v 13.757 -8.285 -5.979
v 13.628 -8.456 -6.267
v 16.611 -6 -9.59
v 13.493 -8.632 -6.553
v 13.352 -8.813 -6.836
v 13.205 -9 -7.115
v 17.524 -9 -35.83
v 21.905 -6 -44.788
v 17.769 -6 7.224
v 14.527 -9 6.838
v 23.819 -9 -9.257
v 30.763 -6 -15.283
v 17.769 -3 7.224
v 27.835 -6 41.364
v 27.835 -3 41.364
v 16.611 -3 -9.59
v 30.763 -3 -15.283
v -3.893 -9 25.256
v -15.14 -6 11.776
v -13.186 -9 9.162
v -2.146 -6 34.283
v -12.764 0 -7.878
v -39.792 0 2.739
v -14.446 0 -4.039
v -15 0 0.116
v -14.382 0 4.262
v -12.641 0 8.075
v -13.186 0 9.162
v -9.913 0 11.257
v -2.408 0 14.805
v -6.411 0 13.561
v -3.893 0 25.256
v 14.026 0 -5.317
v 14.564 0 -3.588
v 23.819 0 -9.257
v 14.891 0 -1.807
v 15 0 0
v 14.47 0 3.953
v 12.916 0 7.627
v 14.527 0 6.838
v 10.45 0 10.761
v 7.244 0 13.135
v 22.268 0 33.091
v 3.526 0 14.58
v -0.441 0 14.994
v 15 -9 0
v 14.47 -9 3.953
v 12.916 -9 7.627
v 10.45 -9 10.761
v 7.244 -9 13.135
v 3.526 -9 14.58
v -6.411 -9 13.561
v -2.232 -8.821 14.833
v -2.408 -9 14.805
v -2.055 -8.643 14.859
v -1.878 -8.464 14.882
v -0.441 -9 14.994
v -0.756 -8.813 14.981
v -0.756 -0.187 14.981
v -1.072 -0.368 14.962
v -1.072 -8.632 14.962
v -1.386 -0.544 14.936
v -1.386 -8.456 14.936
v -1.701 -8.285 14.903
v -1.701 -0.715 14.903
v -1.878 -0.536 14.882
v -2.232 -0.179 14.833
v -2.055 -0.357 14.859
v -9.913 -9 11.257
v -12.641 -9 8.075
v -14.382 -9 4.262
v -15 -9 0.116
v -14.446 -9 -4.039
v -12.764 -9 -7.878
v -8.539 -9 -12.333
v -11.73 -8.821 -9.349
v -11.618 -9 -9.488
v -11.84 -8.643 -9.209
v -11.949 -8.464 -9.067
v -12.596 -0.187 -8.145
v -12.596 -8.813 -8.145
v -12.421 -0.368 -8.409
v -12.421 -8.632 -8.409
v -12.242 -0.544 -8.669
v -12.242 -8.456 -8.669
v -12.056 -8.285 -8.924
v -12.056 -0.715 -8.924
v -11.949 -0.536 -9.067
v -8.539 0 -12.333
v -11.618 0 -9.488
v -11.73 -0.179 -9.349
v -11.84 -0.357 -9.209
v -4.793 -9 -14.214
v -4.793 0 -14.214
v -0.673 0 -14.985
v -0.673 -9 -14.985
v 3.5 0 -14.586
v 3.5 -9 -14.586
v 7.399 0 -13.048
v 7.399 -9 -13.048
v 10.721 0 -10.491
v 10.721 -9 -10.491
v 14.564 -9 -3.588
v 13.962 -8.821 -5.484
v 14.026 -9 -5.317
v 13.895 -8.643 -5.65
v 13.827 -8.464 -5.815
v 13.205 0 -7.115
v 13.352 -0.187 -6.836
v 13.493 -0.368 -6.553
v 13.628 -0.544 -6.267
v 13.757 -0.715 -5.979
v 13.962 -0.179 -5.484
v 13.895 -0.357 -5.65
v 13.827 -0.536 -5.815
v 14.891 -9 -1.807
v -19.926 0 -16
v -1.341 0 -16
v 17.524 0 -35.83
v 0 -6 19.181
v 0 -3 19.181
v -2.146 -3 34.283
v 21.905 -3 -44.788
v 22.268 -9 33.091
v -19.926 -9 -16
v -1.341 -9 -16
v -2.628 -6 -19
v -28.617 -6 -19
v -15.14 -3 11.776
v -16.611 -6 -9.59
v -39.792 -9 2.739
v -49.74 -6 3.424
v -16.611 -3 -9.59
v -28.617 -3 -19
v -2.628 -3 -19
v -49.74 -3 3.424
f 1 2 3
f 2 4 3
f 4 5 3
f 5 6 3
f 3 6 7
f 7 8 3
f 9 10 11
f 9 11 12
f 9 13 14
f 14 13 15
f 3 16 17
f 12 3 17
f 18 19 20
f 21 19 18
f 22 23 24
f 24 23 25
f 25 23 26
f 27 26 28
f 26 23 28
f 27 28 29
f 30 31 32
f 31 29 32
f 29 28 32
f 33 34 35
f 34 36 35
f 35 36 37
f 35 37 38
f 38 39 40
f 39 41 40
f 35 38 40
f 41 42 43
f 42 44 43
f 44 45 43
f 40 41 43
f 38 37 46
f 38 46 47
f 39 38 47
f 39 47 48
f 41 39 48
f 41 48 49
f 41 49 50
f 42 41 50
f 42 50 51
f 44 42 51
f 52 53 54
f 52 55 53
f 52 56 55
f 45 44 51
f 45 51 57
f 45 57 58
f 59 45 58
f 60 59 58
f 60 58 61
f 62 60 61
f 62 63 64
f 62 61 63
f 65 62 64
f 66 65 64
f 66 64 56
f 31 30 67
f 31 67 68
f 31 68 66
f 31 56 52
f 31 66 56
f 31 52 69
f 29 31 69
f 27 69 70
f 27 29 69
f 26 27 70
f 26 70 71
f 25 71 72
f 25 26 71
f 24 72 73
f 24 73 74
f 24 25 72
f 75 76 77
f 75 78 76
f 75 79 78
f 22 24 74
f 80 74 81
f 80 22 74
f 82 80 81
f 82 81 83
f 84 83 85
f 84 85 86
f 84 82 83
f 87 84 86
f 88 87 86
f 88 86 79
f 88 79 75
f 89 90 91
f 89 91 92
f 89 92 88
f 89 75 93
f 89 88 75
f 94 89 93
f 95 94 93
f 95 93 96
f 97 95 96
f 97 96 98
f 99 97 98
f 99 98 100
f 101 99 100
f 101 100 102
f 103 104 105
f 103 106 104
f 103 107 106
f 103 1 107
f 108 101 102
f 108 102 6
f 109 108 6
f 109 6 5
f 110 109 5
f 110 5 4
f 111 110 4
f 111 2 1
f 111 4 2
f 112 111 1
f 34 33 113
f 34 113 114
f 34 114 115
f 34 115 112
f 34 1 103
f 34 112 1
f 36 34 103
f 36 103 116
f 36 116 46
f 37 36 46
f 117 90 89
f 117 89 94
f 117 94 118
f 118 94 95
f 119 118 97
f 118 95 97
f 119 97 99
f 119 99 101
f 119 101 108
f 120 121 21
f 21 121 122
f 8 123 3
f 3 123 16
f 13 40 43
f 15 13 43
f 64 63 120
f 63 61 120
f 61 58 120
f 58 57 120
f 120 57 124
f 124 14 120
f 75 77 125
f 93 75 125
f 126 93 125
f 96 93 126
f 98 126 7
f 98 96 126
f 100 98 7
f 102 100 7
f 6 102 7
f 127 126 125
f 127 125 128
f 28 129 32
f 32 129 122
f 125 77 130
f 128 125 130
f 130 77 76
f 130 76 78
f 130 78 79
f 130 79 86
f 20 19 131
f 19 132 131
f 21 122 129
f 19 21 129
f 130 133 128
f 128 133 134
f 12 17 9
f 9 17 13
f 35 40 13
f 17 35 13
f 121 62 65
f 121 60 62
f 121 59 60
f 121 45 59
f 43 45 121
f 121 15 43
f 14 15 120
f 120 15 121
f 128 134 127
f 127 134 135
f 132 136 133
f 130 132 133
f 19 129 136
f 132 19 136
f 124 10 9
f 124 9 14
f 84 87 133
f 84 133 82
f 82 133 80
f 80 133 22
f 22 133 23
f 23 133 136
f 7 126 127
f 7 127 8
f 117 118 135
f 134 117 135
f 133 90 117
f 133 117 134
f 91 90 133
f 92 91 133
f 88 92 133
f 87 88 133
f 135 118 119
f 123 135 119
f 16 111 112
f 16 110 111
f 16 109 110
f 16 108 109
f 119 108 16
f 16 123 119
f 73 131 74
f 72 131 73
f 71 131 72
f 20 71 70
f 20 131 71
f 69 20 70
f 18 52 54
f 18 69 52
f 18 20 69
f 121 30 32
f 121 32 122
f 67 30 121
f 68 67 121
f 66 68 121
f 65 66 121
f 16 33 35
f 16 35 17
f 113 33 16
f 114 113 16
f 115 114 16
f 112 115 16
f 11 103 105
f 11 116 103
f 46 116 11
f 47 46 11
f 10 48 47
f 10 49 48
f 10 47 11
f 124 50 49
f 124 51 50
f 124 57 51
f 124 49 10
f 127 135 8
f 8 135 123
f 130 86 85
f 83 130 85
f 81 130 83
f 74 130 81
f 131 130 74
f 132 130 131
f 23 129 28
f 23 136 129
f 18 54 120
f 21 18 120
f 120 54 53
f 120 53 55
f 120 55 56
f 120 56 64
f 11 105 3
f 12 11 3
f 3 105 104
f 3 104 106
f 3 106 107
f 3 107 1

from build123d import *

# Parameters (mm, degrees)
F0_R          = 15
F1_DEPTH      = 9
F2_DEPTH      = 9
F3_T4_DEPTH   = 41.4194656766
F3_T9_DEPTH   = 51.0233182668
F3_T14_DEPTH  = 51.0233182668
F3_T19_DEPTH  = 30.6843352159
F3_T24_DEPTH  = 41.4194656766
F3_T29_DEPTH  = 51.0233182668
F3_T34_DEPTH  = 51.0233182668
F3_T39_DEPTH  = 30.6843352159
F3_T44_DEPTH  = 41.4194656766
F3_T49_DEPTH  = 51.0233182668
F3_T54_DEPTH  = 51.0233182668
F3_T59_DEPTH  = 30.6843352159
F3_T64_DEPTH  = 51.0233182668
F3_T69_DEPTH  = 41.4194656766
F3_T74_DEPTH  = 51.0233182668
F3_T79_DEPTH  = 51.0233182668
F3_T84_DEPTH  = 41.4194656766
F3_T89_DEPTH  = 30.6843352159
F3_T94_DEPTH  = 51.0233182668
F3_T99_DEPTH  = 51.0233182668
F3_T104_DEPTH = 41.4194656766
F3_T109_DEPTH = 51.0233182668
F3_T114_DEPTH = 30.6843352159
F3_T119_DEPTH = 30.6843352159
F3_T125_DEPTH = 51.0233182668
F3_T129_DEPTH = 41.4194656766
F3_T136_DEPTH = 51.0233182668
F3_T140_DEPTH = 30.6843352159
F3_T147_DEPTH = 41.4194656766
F3_T151_DEPTH = 51.0233182668
F3_T158_DEPTH = 51.0233182668
F3_T162_DEPTH = 30.6843352159
F3_T169_DEPTH = 41.4194656766
F3_T173_DEPTH = 51.0233182668
F3_T180_DEPTH = 51.0233182668
F3_T184_DEPTH = 30.6843352159
F3_T191_DEPTH = 41.4194656766
F3_T195_DEPTH = 51.0233182668
F3_T202_DEPTH = 51.0233182668
F3_T206_DEPTH = 30.6843352159
F3_T213_DEPTH = 41.4194656766
F3_T217_DEPTH = 51.0233182668
F3_T224_DEPTH = 51.0233182668
F3_T228_DEPTH = 30.6843352159
F3_T235_DEPTH = 51.0233182668
F3_T239_DEPTH = 41.4194656766
F3_T246_DEPTH = 51.0233182668
F3_T250_DEPTH = 30.6843352159


# Not quite as in the source:
# - a fillet or chamfer that OpenCascade refuses, or shapes differently, is made with other operations: its cross-section is extruded or revolved along the edge and cut away or added


with BuildPart() as f1:
    # F0 (on Front) → F1 (new body)
    with BuildSketch(Plane.XZ):
        with BuildLine():
            ThreePointArc((-16.6111198958, -9.5904345434), (-19.1355906319, 1.3171598584), (-15.1404052923, 11.7759868593))
            Line((-15.1404052923, 11.7759868593), (-49.7397878859, 3.4237381657))
            Line((-49.7397878859, 3.4237381657), (-16.6111198958, -9.5904345434))
        make_face()
        with BuildLine():
            ThreePointArc((0, 19.1808690868), (10.7084892142, 15.9133276745), (17.7685064209, 7.2239821771))
            Line((17.7685064209, 7.2239821771), (27.8349381703, 41.3640508052))
            Line((27.8349381703, 41.3640508052), (0, 19.1808690868))
        make_face()
        with BuildLine():
            Line((21.9048497156, -44.7877889709), (16.6111198958, -9.5904345434))
            ThreePointArc((16.6111198958, -9.5904345434), (8.4271014177, -17.2304875329), (-2.6281011286, -18.9999690364))
            Line((-2.6281011286, -18.9999690364), (21.9048497156, -44.7877889709))
        make_face()
        with BuildLine():
            ThreePointArc((16.6111198958, -9.5904345434), (18.5272968216, -4.9643742213), (19.1808690868, 0))
            ThreePointArc((19.1808690868, 0), (18.8244672495, 3.6803765702), (17.7685064209, 7.2239821771))
            ThreePointArc((17.7685064209, 7.2239821771), (10.7084892142, 15.9133276745), (0, 19.1808690868))
            ThreePointArc((0, 19.1808690868), (-8.4271014177, 17.2304875329), (-15.1404052923, 11.7759868593))
            ThreePointArc((-15.1404052923, 11.7759868593), (-19.1355906319, 1.3171598584), (-16.6111198958, -9.5904345434))
            ThreePointArc((-16.6111198958, -9.5904345434), (-10.7084892142, -15.9133276745), (-2.6281011286, -18.9999690364))
            ThreePointArc((-2.6281011286, -18.9999690364), (8.4271014177, -17.2304875329), (16.6111198958, -9.5904345434))
        make_face()
        Circle(F0_R, mode=Mode.SUBTRACT)
    extrude(amount=F1_DEPTH)

    # F0 (on Front) → F2 (join)
    with BuildSketch(Plane.XZ):
        with BuildLine():
            ThreePointArc((16.6111198958, -9.5904345434), (18.5272968216, -4.9643742213), (19.1808690868, 0))
            ThreePointArc((19.1808690868, 0), (18.8244672495, 3.6803765702), (17.7685064209, 7.2239821771))
            ThreePointArc((17.7685064209, 7.2239821771), (10.7084892142, 15.9133276745), (0, 19.1808690868))
            ThreePointArc((0, 19.1808690868), (-8.4271014177, 17.2304875329), (-15.1404052923, 11.7759868593))
            ThreePointArc((-15.1404052923, 11.7759868593), (-19.1355906319, 1.3171598584), (-16.6111198958, -9.5904345434))
            ThreePointArc((-16.6111198958, -9.5904345434), (-10.7084892142, -15.9133276745), (-2.6281011286, -18.9999690364))
            ThreePointArc((-2.6281011286, -18.9999690364), (8.4271014177, -17.2304875329), (16.6111198958, -9.5904345434))
        make_face()
        Circle(F0_R, mode=Mode.SUBTRACT)
        with BuildLine():
            ThreePointArc((17.7685064209, 7.2239821771), (18.8244672495, 3.6803765702), (19.1808690868, 0))
            ThreePointArc((19.1808690868, 0), (18.5272968216, -4.9643742213), (16.6111198958, -9.5904345434))
            Line((16.6111198958, -9.5904345434), (30.7631902953, -15.2834705217))
            Line((30.7631902953, -15.2834705217), (17.7685064209, 7.2239821771))
        make_face()
        with BuildLine():
            ThreePointArc((0, 19.1808690868), (10.7084892142, 15.9133276745), (17.7685064209, 7.2239821771))
            Line((17.7685064209, 7.2239821771), (27.8349381703, 41.3640508052))
            Line((27.8349381703, 41.3640508052), (0, 19.1808690868))
        make_face()
        with BuildLine():
            Line((21.9048497156, -44.7877889709), (16.6111198958, -9.5904345434))
            ThreePointArc((16.6111198958, -9.5904345434), (8.4271014177, -17.2304875329), (-2.6281011286, -18.9999690364))
            Line((-2.6281011286, -18.9999690364), (21.9048497156, -44.7877889709))
        make_face()
        with BuildLine():
            ThreePointArc((-15.1404052923, 11.7759868593), (-8.4271014177, 17.2304875329), (0, 19.1808690868))
            Line((0, 19.1808690868), (-2.1457214179, 34.2834395581))
            Line((-2.1457214179, 34.2834395581), (-15.1404052923, 11.7759868593))
        make_face()
        with BuildLine():
            Line((-28.6174688775, -18.9999690364), (-2.6281011286, -18.9999690364))
            ThreePointArc((-2.6281011286, -18.9999690364), (-10.7084892142, -15.9133276745), (-16.6111198958, -9.5904345434))
            Line((-16.6111198958, -9.5904345434), (-28.6174688775, -18.9999690364))
        make_face()
        with BuildLine():
            ThreePointArc((-16.6111198958, -9.5904345434), (-19.1355906319, 1.3171598584), (-15.1404052923, 11.7759868593))
            Line((-15.1404052923, 11.7759868593), (-49.7397878859, 3.4237381657))
            Line((-49.7397878859, 3.4237381657), (-16.6111198958, -9.5904345434))
        make_face()
    extrude(amount=F2_DEPTH)

    # F3: chamfer of 3 on 24 edges, made by hand


with BuildPart() as f3_tool2:
    # F3_s3 → F3_t4 (new body)
    with BuildSketch(Plane(origin=(18.1662589207, 0, 31.4648834341), x_dir=(0, 1, 0), z_dir=(-0.5, 0, -0.8660254038))):
        Polygon((-6, -18.9999690364), (-9, -15.9999690364), (-9, -18.9999690364), align=None)
    extrude(amount=F3_T4_DEPTH)

    split(bisect_by=Plane(origin=(-3.5198762352, 0, 14.5811683787), x_dir=(0, 1, 0), z_dir=(-0.2346584157, 0, 0.9720778919)), keep=Keep.TOP)


with BuildPart() as f1_1:
    add(f1.part)

    # F3_t1: cut F3_tool2
    add(f3_tool2.part, mode=Mode.SUBTRACT)


with BuildPart() as f3_tool7:
    # F3_s8 → F3_t9 (new body)
    with BuildSketch(Plane(origin=(-4.1209005243, 0, -0.9947803527), x_dir=(0, 1, 0), z_dir=(-0.9720778919, 0, -0.2346584157))):
        Polygon((-6, -15), (-9, -12), (-9, -15), align=None)
    extrude(amount=F3_T9_DEPTH)

    split(bisect_by=Plane(origin=(-16.4544558566, 0, 9.4999845182), x_dir=(0, 1, 0), z_dir=(-0.8660254038, 0, 0.5)), keep=Keep.TOP)


with BuildPart() as f1_2:
    add(f1_1.part)

    # F3_t6: cut F3_tool7
    add(f3_tool7.part, mode=Mode.SUBTRACT)


with BuildPart() as f3_tool12:
    # F3_s13 → F3_t14 (new body)
    with BuildSketch(Plane(origin=(-51.4360857888, 0, 20.2060072), x_dir=(0, 1, 0), z_dir=(0.930757815, 0, -0.3656362809))):
        Polygon((-6, -15), (-9, -12), (-9, -15), align=None)
    extrude(amount=F3_T14_DEPTH)

    split(bisect_by=Plane(origin=(-1.6642890677, 0, 2.1235944635), x_dir=(0, 1, 0), z_dir=(-0.6168472612, 0, 0.7870828777)), keep=Keep.TOP)


with BuildPart() as f1_3:
    add(f1_2.part)

    # F3_t11: cut F3_tool12
    add(f3_tool12.part, mode=Mode.SUBTRACT)


with BuildPart() as f3_tool17:
    # F3_s18 → F3_t19 (new body)
    with BuildSketch(Plane(origin=(-8.8744478881, 0, -6.9550221835), x_dir=(0, 1, 0), z_dir=(-0.7870828777, 0, -0.6168472612))):
        Polygon((-9, 0.3019430054), (-6, -2.6980569946), (-9, -2.6980569946), align=None)
    extrude(amount=F3_T19_DEPTH)

    split(bisect_by=Plane(origin=(-5.4845442131, 0, -13.9613672244), x_dir=(0, 1, 0), z_dir=(-0.3656362809, 0, -0.930757815)), keep=Keep.TOP)


with BuildPart() as f1_4:
    add(f1_3.part)

    # F3_t16: cut F3_tool17
    add(f3_tool17.part, mode=Mode.SUBTRACT)


with BuildPart() as f3_tool22:
    # F3_s23 → F3_t24 (new body)
    with BuildSketch(Plane.YZ.offset(-36.3325178414)):
        Polygon((-9, -15.9999690364), (-6, -18.9999690364), (-9, -18.9999690364), align=None)
    extrude(amount=F3_T24_DEPTH)

    split(bisect_by=Plane(origin=(-10.8677241153, 0, -10.3388864272), x_dir=(0, 1, 0), z_dir=(-0.724514941, 0, -0.6892590951)), keep=Keep.TOP)


with BuildPart() as f1_5:
    add(f1_4.part)

    # F3_t21: cut F3_tool22
    add(f3_tool22.part, mode=Mode.SUBTRACT)


with BuildPart() as f3_tool27:
    # F3_s28 → F3_t29 (new body)
    with BuildSketch(Plane(origin=(2.9219553188, 0, -3.0714143641), x_dir=(0, 1, 0), z_dir=(0.6892590951, 0, -0.724514941))):
        Polygon((-9, -12), (-6, -15), (-9, -15), align=None)
    extrude(amount=F3_T29_DEPTH)

    split(bisect_by=Plane.XY.offset(-18.9999690364), keep=Keep.BOTTOM)


with BuildPart() as f1_6:
    add(f1_5.part)

    # F3_t26: cut F3_tool27
    add(f3_tool27.part, mode=Mode.SUBTRACT)


with BuildPart() as f3_tool32:
    # F3_s33 → F3_t34 (new body)
    with BuildSketch(Plane(origin=(8.2191273501, 0, -54.6479605643), x_dir=(0, 1, 0), z_dir=(-0.1487285997, 0, 0.988878053))):
        Polygon((-9, -12), (-6, -15), (-9, -15), align=None)
    extrude(amount=F3_T34_DEPTH)

    split(bisect_by=Plane(origin=(-1.0069422189, 0, -2.5031138436), x_dir=(0, 1, 0), z_dir=(-0.3732101364, 0, -0.9277468373)), keep=Keep.TOP)


with BuildPart() as f1_7:
    add(f1_6.part)

    # F3_t31: cut F3_tool32
    add(f3_tool32.part, mode=Mode.SUBTRACT)


with BuildPart() as f3_tool37:
    # F3_s38 → F3_t39 (new body)
    with BuildSketch(Plane(origin=(10.4604498388, 0, -4.207986224), x_dir=(0, 1, 0), z_dir=(0.9277468373, 0, -0.3732101364))):
        Polygon((-9, 0.3019430054), (-6, -2.6980569946), (-9, -2.6980569946), align=None)
    extrude(amount=F3_T39_DEPTH)

    split(bisect_by=Plane(origin=(14.8331707944, 0, 2.2309289955), x_dir=(0, 1, 0), z_dir=(0.988878053, 0, 0.1487285997)), keep=Keep.TOP)


with BuildPart() as f1_8:
    add(f1_7.part)

    # F3_t36: cut F3_tool37
    add(f3_tool37.part, mode=Mode.SUBTRACT)


with BuildPart() as f3_tool42:
    # F3_s43 → F3_t44 (new body)
    with BuildSketch(Plane(origin=(18.1662589207, 0, -31.4648834341), x_dir=(0, 1, 0), z_dir=(-0.5, 0, 0.8660254038))):
        Polygon((-9, -15.9999690364), (-6, -18.9999690364), (-9, -18.9999690364), align=None)
    extrude(amount=F3_T44_DEPTH)

    split(bisect_by=Plane(origin=(14.3876003504, 0, -4.2422819515), x_dir=(0, 1, 0), z_dir=(0.9591733567, 0, -0.2828187968)), keep=Keep.TOP)


with BuildPart() as f1_9:
    add(f1_8.part)

    # F3_t41: cut F3_tool42
    add(f3_tool42.part, mode=Mode.SUBTRACT)


with BuildPart() as f3_tool47:
    # F3_s48 → F3_t49 (new body)
    with BuildSketch(Plane(origin=(1.1989452055, 0, 4.0661947169), x_dir=(0, 1, 0), z_dir=(0.2828187968, 0, 0.9591733567))):
        Polygon((-9, -12), (-6, -15), (-9, -15), align=None)
    extrude(amount=F3_T49_DEPTH)

    split(bisect_by=Plane(origin=(16.4544558566, 0, 9.4999845182), x_dir=(0, 1, 0), z_dir=(0.8660254038, 0, 0.5)), keep=Keep.TOP)


with BuildPart() as f1_10:
    add(f1_9.part)

    # F3_t46: cut F3_tool47
    add(f3_tool47.part, mode=Mode.SUBTRACT)


with BuildPart() as f3_tool52:
    # F3_s53 → F3_t54 (new body)
    with BuildSketch(Plane(origin=(43.2169584386, 0, 34.4419533643), x_dir=(0, 1, 0), z_dir=(-0.7820292153, 0, -0.6232417721))):
        Polygon((-9, -12), (-6, -15), (-9, -15), align=None)
    extrude(amount=F3_T54_DEPTH)

    split(bisect_by=Plane(origin=(2.6712312866, 0, 0.3795193801), x_dir=(0, 1, 0), z_dir=(0.9900573976, 0, 0.1406639596)), keep=Keep.TOP)


with BuildPart() as f1_11:
    add(f1_10.part)

    # F3_t51: cut F3_tool52
    add(f3_tool52.part, mode=Mode.SUBTRACT)


with BuildPart() as f3_tool57:
    # F3_s58 → F3_t59 (new body)
    with BuildSketch(Plane(origin=(-1.5860019507, 0, 11.1630084074), x_dir=(0, 1, 0), z_dir=(-0.1406639596, 0, 0.9900573976))):
        Polygon((-9, 0.3019430054), (-6, -2.6980569946), (-9, -2.6980569946), align=None)
    extrude(amount=F3_T59_DEPTH)

    split(bisect_by=Plane(origin=(-9.3486265813, 0, 11.7304382289), x_dir=(0, 1, 0), z_dir=(-0.6232417721, 0, 0.7820292153)), keep=Keep.TOP)


with BuildPart() as f1_12:
    add(f1_11.part)

    # F3_t56: cut F3_tool57
    add(f3_tool57.part, mode=Mode.SUBTRACT)


with BuildPart() as f3_tool62:
    # F3_s63 → F3_t64 (new body)
    with BuildSketch(Plane(origin=(1.1989452055, 0, 4.0661947169), x_dir=(0, 1, 0), z_dir=(0.2828187968, 0, 0.9591733567))):
        Polygon((0, -12), (-3, -15), (0, -15), align=None)
    extrude(amount=F3_T64_DEPTH)

    split(bisect_by=Plane(origin=(16.4544558566, 0, 9.4999845182), x_dir=(0, 1, 0), z_dir=(0.8660254038, 0, 0.5)), keep=Keep.TOP)


with BuildPart() as f1_13:
    add(f1_12.part)

    # F3_t61: cut F3_tool62
    add(f3_tool62.part, mode=Mode.SUBTRACT)


with BuildPart() as f3_tool67:
    # F3_s68 → F3_t69 (new body)
    with BuildSketch(Plane(origin=(18.1662589207, 0, -31.4648834341), x_dir=(0, 1, 0), z_dir=(-0.5, 0, 0.8660254038))):
        Polygon((0, -15.9999690364), (-3, -18.9999690364), (0, -18.9999690364), align=None)
    extrude(amount=F3_T69_DEPTH)

    split(bisect_by=Plane(origin=(14.3876003504, 0, -4.2422819515), x_dir=(0, 1, 0), z_dir=(0.9591733567, 0, -0.2828187968)), keep=Keep.TOP)


with BuildPart() as f1_14:
    add(f1_13.part)

    # F3_t66: cut F3_tool67
    add(f3_tool67.part, mode=Mode.SUBTRACT)


with BuildPart() as f3_tool72:
    # F3_s73 → F3_t74 (new body)
    with BuildSketch(Plane(origin=(8.2191273501, 0, -54.6479605643), x_dir=(0, 1, 0), z_dir=(-0.1487285997, 0, 0.988878053))):
        Polygon((0, -12), (-3, -15), (0, -15), align=None)
    extrude(amount=F3_T74_DEPTH)

    split(bisect_by=Plane(origin=(-1.0069422189, 0, -2.5031138436), x_dir=(0, 1, 0), z_dir=(-0.3732101364, 0, -0.9277468373)), keep=Keep.TOP)


with BuildPart() as f1_15:
    add(f1_14.part)

    # F3_t71: cut F3_tool72
    add(f3_tool72.part, mode=Mode.SUBTRACT)


with BuildPart() as f3_tool77:
    # F3_s78 → F3_t79 (new body)
    with BuildSketch(Plane(origin=(2.9219553188, 0, -3.0714143641), x_dir=(0, 1, 0), z_dir=(0.6892590951, 0, -0.724514941))):
        Polygon((0, -12), (-3, -15), (0, -15), align=None)
    extrude(amount=F3_T79_DEPTH)

    split(bisect_by=Plane.XY.offset(-18.9999690364), keep=Keep.BOTTOM)


with BuildPart() as f1_16:
    add(f1_15.part)

    # F3_t76: cut F3_tool77
    add(f3_tool77.part, mode=Mode.SUBTRACT)


with BuildPart() as f3_tool82:
    # F3_s83 → F3_t84 (new body)
    with BuildSketch(Plane.YZ.offset(-36.3325178414)):
        Polygon((0, -15.9999690364), (-3, -18.9999690364), (0, -18.9999690364), align=None)
    extrude(amount=F3_T84_DEPTH)

    split(bisect_by=Plane(origin=(-10.8677241153, 0, -10.3388864272), x_dir=(0, 1, 0), z_dir=(-0.724514941, 0, -0.6892590951)), keep=Keep.TOP)


with BuildPart() as f1_17:
    add(f1_16.part)

    # F3_t81: cut F3_tool82
    add(f3_tool82.part, mode=Mode.SUBTRACT)


with BuildPart() as f3_tool87:
    # F3_s88 → F3_t89 (new body)
    with BuildSketch(Plane(origin=(-8.8744478881, 0, -6.9550221835), x_dir=(0, 1, 0), z_dir=(-0.7870828777, 0, -0.6168472612))):
        Polygon((0, 0.3019430054), (-3, -2.6980569946), (0, -2.6980569946), align=None)
    extrude(amount=F3_T89_DEPTH)

    split(bisect_by=Plane(origin=(-5.4845442131, 0, -13.9613672244), x_dir=(0, 1, 0), z_dir=(-0.3656362809, 0, -0.930757815)), keep=Keep.TOP)


with BuildPart() as f1_18:
    add(f1_17.part)

    # F3_t86: cut F3_tool87
    add(f3_tool87.part, mode=Mode.SUBTRACT)


with BuildPart() as f3_tool92:
    # F3_s93 → F3_t94 (new body)
    with BuildSketch(Plane(origin=(-51.4360857888, 0, 20.2060072), x_dir=(0, 1, 0), z_dir=(0.930757815, 0, -0.3656362809))):
        Polygon((-3, -15), (0, -12), (0, -15), align=None)
    extrude(amount=F3_T94_DEPTH)

    split(bisect_by=Plane(origin=(-1.6642890677, 0, 2.1235944635), x_dir=(0, 1, 0), z_dir=(-0.6168472612, 0, 0.7870828777)), keep=Keep.TOP)


with BuildPart() as f1_19:
    add(f1_18.part)

    # F3_t91: cut F3_tool92
    add(f3_tool92.part, mode=Mode.SUBTRACT)


with BuildPart() as f3_tool97:
    # F3_s98 → F3_t99 (new body)
    with BuildSketch(Plane(origin=(-4.1209005243, 0, -0.9947803527), x_dir=(0, 1, 0), z_dir=(-0.9720778919, 0, -0.2346584157))):
        Polygon((-3, -15), (0, -12), (0, -15), align=None)
    extrude(amount=F3_T99_DEPTH)

    split(bisect_by=Plane(origin=(-16.4544558566, 0, 9.4999845182), x_dir=(0, 1, 0), z_dir=(-0.8660254038, 0, 0.5)), keep=Keep.TOP)


with BuildPart() as f1_20:
    add(f1_19.part)

    # F3_t96: cut F3_tool97
    add(f3_tool97.part, mode=Mode.SUBTRACT)


with BuildPart() as f3_tool102:
    # F3_s103 → F3_t104 (new body)
    with BuildSketch(Plane(origin=(18.1662589207, 0, 31.4648834341), x_dir=(0, 1, 0), z_dir=(-0.5, 0, -0.8660254038))):
        Polygon((-3, -18.9999690364), (0, -15.9999690364), (0, -18.9999690364), align=None)
    extrude(amount=F3_T104_DEPTH)

    split(bisect_by=Plane(origin=(-3.5198762352, 0, 14.5811683787), x_dir=(0, 1, 0), z_dir=(-0.2346584157, 0, 0.9720778919)), keep=Keep.TOP)


with BuildPart() as f1_21:
    add(f1_20.part)

    # F3_t101: cut F3_tool102
    add(f3_tool102.part, mode=Mode.SUBTRACT)


with BuildPart() as f3_tool107:
    # F3_s108 → F3_t109 (new body)
    with BuildSketch(Plane(origin=(43.2169584386, 0, 34.4419533643), x_dir=(0, 1, 0), z_dir=(-0.7820292153, 0, -0.6232417721))):
        Polygon((0, -12), (-3, -15), (0, -15), align=None)
    extrude(amount=F3_T109_DEPTH)

    split(bisect_by=Plane(origin=(2.6712312866, 0, 0.3795193801), x_dir=(0, 1, 0), z_dir=(0.9900573976, 0, 0.1406639596)), keep=Keep.TOP)


with BuildPart() as f1_22:
    add(f1_21.part)

    # F3_t106: cut F3_tool107
    add(f3_tool107.part, mode=Mode.SUBTRACT)


with BuildPart() as f3_tool112:
    # F3_s113 → F3_t114 (new body)
    with BuildSketch(Plane(origin=(10.4604498388, 0, -4.207986224), x_dir=(0, 1, 0), z_dir=(0.9277468373, 0, -0.3732101364))):
        Polygon((0, 0.3019430054), (-3, -2.6980569946), (0, -2.6980569946), align=None)
    extrude(amount=F3_T114_DEPTH)

    split(bisect_by=Plane(origin=(14.8331707944, 0, 2.2309289955), x_dir=(0, 1, 0), z_dir=(0.988878053, 0, 0.1487285997)), keep=Keep.TOP)


with BuildPart() as f1_23:
    add(f1_22.part)

    # F3_t111: cut F3_tool112
    add(f3_tool112.part, mode=Mode.SUBTRACT)


with BuildPart() as f3_tool117:
    # F3_s118 → F3_t119 (new body)
    with BuildSketch(Plane(origin=(-1.5860019507, 0, 11.1630084074), x_dir=(0, 1, 0), z_dir=(-0.1406639596, 0, 0.9900573976))):
        Polygon((0, 0.3019430054), (-3, -2.6980569946), (0, -2.6980569946), align=None)
    extrude(amount=F3_T119_DEPTH)

    split(bisect_by=Plane(origin=(-9.3486265813, 0, 11.7304382289), x_dir=(0, 1, 0), z_dir=(-0.6232417721, 0, 0.7820292153)), keep=Keep.TOP)


with BuildPart() as f1_24:
    add(f1_23.part)

    # F3_t116: cut F3_tool117
    add(f3_tool117.part, mode=Mode.SUBTRACT)


with BuildPart() as f3_tool123:
    # F3_s124 → F3_t125 (new body)
    with BuildSketch(Plane(origin=(-4.1209005243, 0, -0.9947803527), x_dir=(0, 1, 0), z_dir=(-0.9720778919, 0, -0.2346584157))):
        Polygon((-6, -15), (-9, -12), (-9, -15), align=None)
    extrude(amount=F3_T125_DEPTH)

    split(bisect_by=Plane(origin=(-16.4544558566, 0, 9.4999845182), x_dir=(0, 1, 0), z_dir=(0.8660254038, 0, -0.5)), keep=Keep.TOP)


with BuildPart() as f3_tool127:
    # F3_s128 → F3_t129 (new body)
    with BuildSketch(Plane(origin=(18.1662589207, 0, 31.4648834341), x_dir=(0, 1, 0), z_dir=(-0.5, 0, -0.8660254038))):
        Polygon((-6, -18.9999690364), (-9, -15.9999690364), (-9, -18.9999690364), align=None)
    extrude(amount=F3_T129_DEPTH)

    split(bisect_by=Plane(origin=(-3.5198762352, 0, 14.5811683787), x_dir=(0, 1, 0), z_dir=(0.2346584157, 0, -0.9720778919)), keep=Keep.TOP)


with BuildPart() as f3_tool123_1:
    add(f3_tool123.part)

    # F3_t131: intersect F3_tool127
    add(f3_tool127.part, mode=Mode.INTERSECT)


with BuildPart() as f1_25:
    add(f1_24.part)

    # F3_t121: cut F3_tool123
    add(f3_tool123_1.part, mode=Mode.SUBTRACT)


with BuildPart() as f3_tool134:
    # F3_s135 → F3_t136 (new body)
    with BuildSketch(Plane(origin=(-51.4360857888, 0, 20.2060072), x_dir=(0, 1, 0), z_dir=(0.930757815, 0, -0.3656362809))):
        Polygon((-6, -15), (-9, -12), (-9, -15), align=None)
    extrude(amount=F3_T136_DEPTH)

    split(bisect_by=Plane(origin=(-1.6642890677, 0, 2.1235944635), x_dir=(0, 1, 0), z_dir=(0.6168472612, 0, -0.7870828777)), keep=Keep.TOP)


with BuildPart() as f3_tool138:
    # F3_s139 → F3_t140 (new body)
    with BuildSketch(Plane(origin=(-8.8744478881, 0, -6.9550221835), x_dir=(0, 1, 0), z_dir=(-0.7870828777, 0, -0.6168472612))):
        Polygon((-9, 0.3019430054), (-6, -2.6980569946), (-9, -2.6980569946), align=None)
    extrude(amount=F3_T140_DEPTH)

    split(bisect_by=Plane(origin=(-5.4845442131, 0, -13.9613672244), x_dir=(0, 1, 0), z_dir=(0.3656362809, 0, 0.930757815)), keep=Keep.TOP)


with BuildPart() as f3_tool134_1:
    add(f3_tool134.part)

    # F3_t142: intersect F3_tool138
    add(f3_tool138.part, mode=Mode.INTERSECT)


with BuildPart() as f1_26:
    add(f1_25.part)

    # F3_t132: cut F3_tool134
    add(f3_tool134_1.part, mode=Mode.SUBTRACT)


with BuildPart() as f3_tool145:
    # F3_s146 → F3_t147 (new body)
    with BuildSketch(Plane.YZ.offset(-36.3325178414)):
        Polygon((-9, -15.9999690364), (-6, -18.9999690364), (-9, -18.9999690364), align=None)
    extrude(amount=F3_T147_DEPTH)

    split(bisect_by=Plane(origin=(-10.8677241153, 0, -10.3388864272), x_dir=(0, 1, 0), z_dir=(0.724514941, 0, 0.6892590951)), keep=Keep.TOP)


with BuildPart() as f3_tool149:
    # F3_s150 → F3_t151 (new body)
    with BuildSketch(Plane(origin=(2.9219553188, 0, -3.0714143641), x_dir=(0, 1, 0), z_dir=(0.6892590951, 0, -0.724514941))):
        Polygon((-9, -12), (-6, -15), (-9, -15), align=None)
    extrude(amount=F3_T151_DEPTH)

    split(bisect_by=Plane.XY.offset(-18.9999690364), keep=Keep.TOP)


with BuildPart() as f3_tool145_1:
    add(f3_tool145.part)

    # F3_t153: intersect F3_tool149
    add(f3_tool149.part, mode=Mode.INTERSECT)


with BuildPart() as f1_27:
    add(f1_26.part)

    # F3_t143: cut F3_tool145
    add(f3_tool145_1.part, mode=Mode.SUBTRACT)


with BuildPart() as f3_tool156:
    # F3_s157 → F3_t158 (new body)
    with BuildSketch(Plane(origin=(8.2191273501, 0, -54.6479605643), x_dir=(0, 1, 0), z_dir=(-0.1487285997, 0, 0.988878053))):
        Polygon((-9, -12), (-6, -15), (-9, -15), align=None)
    extrude(amount=F3_T158_DEPTH)

    split(bisect_by=Plane(origin=(-1.0069422189, 0, -2.5031138436), x_dir=(0, 1, 0), z_dir=(0.3732101364, 0, 0.9277468373)), keep=Keep.TOP)


with BuildPart() as f3_tool160:
    # F3_s161 → F3_t162 (new body)
    with BuildSketch(Plane(origin=(10.4604498388, 0, -4.207986224), x_dir=(0, 1, 0), z_dir=(0.9277468373, 0, -0.3732101364))):
        Polygon((-9, 0.3019430054), (-6, -2.6980569946), (-9, -2.6980569946), align=None)
    extrude(amount=F3_T162_DEPTH)

    split(bisect_by=Plane(origin=(14.8331707944, 0, 2.2309289955), x_dir=(0, 1, 0), z_dir=(-0.988878053, 0, -0.1487285997)), keep=Keep.TOP)


with BuildPart() as f3_tool156_1:
    add(f3_tool156.part)

    # F3_t164: intersect F3_tool160
    add(f3_tool160.part, mode=Mode.INTERSECT)


with BuildPart() as f1_28:
    add(f1_27.part)

    # F3_t154: cut F3_tool156
    add(f3_tool156_1.part, mode=Mode.SUBTRACT)


with BuildPart() as f3_tool167:
    # F3_s168 → F3_t169 (new body)
    with BuildSketch(Plane(origin=(18.1662589207, 0, -31.4648834341), x_dir=(0, 1, 0), z_dir=(-0.5, 0, 0.8660254038))):
        Polygon((-9, -15.9999690364), (-6, -18.9999690364), (-9, -18.9999690364), align=None)
    extrude(amount=F3_T169_DEPTH)

    split(bisect_by=Plane(origin=(14.3876003504, 0, -4.2422819515), x_dir=(0, 1, 0), z_dir=(-0.9591733567, 0, 0.2828187968)), keep=Keep.TOP)


with BuildPart() as f3_tool171:
    # F3_s172 → F3_t173 (new body)
    with BuildSketch(Plane(origin=(1.1989452055, 0, 4.0661947169), x_dir=(0, 1, 0), z_dir=(0.2828187968, 0, 0.9591733567))):
        Polygon((-9, -12), (-6, -15), (-9, -15), align=None)
    extrude(amount=F3_T173_DEPTH)

    split(bisect_by=Plane(origin=(16.4544558566, 0, 9.4999845182), x_dir=(0, 1, 0), z_dir=(-0.8660254038, 0, -0.5)), keep=Keep.TOP)


with BuildPart() as f3_tool167_1:
    add(f3_tool167.part)

    # F3_t175: intersect F3_tool171
    add(f3_tool171.part, mode=Mode.INTERSECT)


with BuildPart() as f1_29:
    add(f1_28.part)

    # F3_t165: cut F3_tool167
    add(f3_tool167_1.part, mode=Mode.SUBTRACT)


with BuildPart() as f3_tool178:
    # F3_s179 → F3_t180 (new body)
    with BuildSketch(Plane(origin=(43.2169584386, 0, 34.4419533643), x_dir=(0, 1, 0), z_dir=(-0.7820292153, 0, -0.6232417721))):
        Polygon((-9, -12), (-6, -15), (-9, -15), align=None)
    extrude(amount=F3_T180_DEPTH)

    split(bisect_by=Plane(origin=(2.6712312866, 0, 0.3795193801), x_dir=(0, 1, 0), z_dir=(-0.9900573976, 0, -0.1406639596)), keep=Keep.TOP)


with BuildPart() as f3_tool182:
    # F3_s183 → F3_t184 (new body)
    with BuildSketch(Plane(origin=(-1.5860019507, 0, 11.1630084074), x_dir=(0, 1, 0), z_dir=(-0.1406639596, 0, 0.9900573976))):
        Polygon((-9, 0.3019430054), (-6, -2.6980569946), (-9, -2.6980569946), align=None)
    extrude(amount=F3_T184_DEPTH)

    split(bisect_by=Plane(origin=(-9.3486265813, 0, 11.7304382289), x_dir=(0, 1, 0), z_dir=(0.6232417721, 0, -0.7820292153)), keep=Keep.TOP)


with BuildPart() as f3_tool178_1:
    add(f3_tool178.part)

    # F3_t186: intersect F3_tool182
    add(f3_tool182.part, mode=Mode.INTERSECT)


with BuildPart() as f1_30:
    add(f1_29.part)

    # F3_t176: cut F3_tool178
    add(f3_tool178_1.part, mode=Mode.SUBTRACT)


with BuildPart() as f3_tool189:
    # F3_s190 → F3_t191 (new body)
    with BuildSketch(Plane(origin=(18.1662589207, 0, -31.4648834341), x_dir=(0, 1, 0), z_dir=(-0.5, 0, 0.8660254038))):
        Polygon((0, -15.9999690364), (-3, -18.9999690364), (0, -18.9999690364), align=None)
    extrude(amount=F3_T191_DEPTH)

    split(bisect_by=Plane(origin=(14.3876003504, 0, -4.2422819515), x_dir=(0, 1, 0), z_dir=(-0.9591733567, 0, 0.2828187968)), keep=Keep.TOP)


with BuildPart() as f3_tool193:
    # F3_s194 → F3_t195 (new body)
    with BuildSketch(Plane(origin=(1.1989452055, 0, 4.0661947169), x_dir=(0, 1, 0), z_dir=(0.2828187968, 0, 0.9591733567))):
        Polygon((0, -12), (-3, -15), (0, -15), align=None)
    extrude(amount=F3_T195_DEPTH)

    split(bisect_by=Plane(origin=(16.4544558566, 0, 9.4999845182), x_dir=(0, 1, 0), z_dir=(-0.8660254038, 0, -0.5)), keep=Keep.TOP)


with BuildPart() as f3_tool189_1:
    add(f3_tool189.part)

    # F3_t197: intersect F3_tool193
    add(f3_tool193.part, mode=Mode.INTERSECT)


with BuildPart() as f1_31:
    add(f1_30.part)

    # F3_t187: cut F3_tool189
    add(f3_tool189_1.part, mode=Mode.SUBTRACT)


with BuildPart() as f3_tool200:
    # F3_s201 → F3_t202 (new body)
    with BuildSketch(Plane(origin=(8.2191273501, 0, -54.6479605643), x_dir=(0, 1, 0), z_dir=(-0.1487285997, 0, 0.988878053))):
        Polygon((0, -12), (-3, -15), (0, -15), align=None)
    extrude(amount=F3_T202_DEPTH)

    split(bisect_by=Plane(origin=(-1.0069422189, 0, -2.5031138436), x_dir=(0, 1, 0), z_dir=(0.3732101364, 0, 0.9277468373)), keep=Keep.TOP)


with BuildPart() as f3_tool204:
    # F3_s205 → F3_t206 (new body)
    with BuildSketch(Plane(origin=(10.4604498388, 0, -4.207986224), x_dir=(0, 1, 0), z_dir=(0.9277468373, 0, -0.3732101364))):
        Polygon((0, 0.3019430054), (-3, -2.6980569946), (0, -2.6980569946), align=None)
    extrude(amount=F3_T206_DEPTH)

    split(bisect_by=Plane(origin=(14.8331707944, 0, 2.2309289955), x_dir=(0, 1, 0), z_dir=(-0.988878053, 0, -0.1487285997)), keep=Keep.TOP)


with BuildPart() as f3_tool200_1:
    add(f3_tool200.part)

    # F3_t208: intersect F3_tool204
    add(f3_tool204.part, mode=Mode.INTERSECT)


with BuildPart() as f1_32:
    add(f1_31.part)

    # F3_t198: cut F3_tool200
    add(f3_tool200_1.part, mode=Mode.SUBTRACT)


with BuildPart() as f3_tool211:
    # F3_s212 → F3_t213 (new body)
    with BuildSketch(Plane.YZ.offset(-36.3325178414)):
        Polygon((0, -15.9999690364), (-3, -18.9999690364), (0, -18.9999690364), align=None)
    extrude(amount=F3_T213_DEPTH)

    split(bisect_by=Plane(origin=(-10.8677241153, 0, -10.3388864272), x_dir=(0, 1, 0), z_dir=(0.724514941, 0, 0.6892590951)), keep=Keep.TOP)


with BuildPart() as f3_tool215:
    # F3_s216 → F3_t217 (new body)
    with BuildSketch(Plane(origin=(2.9219553188, 0, -3.0714143641), x_dir=(0, 1, 0), z_dir=(0.6892590951, 0, -0.724514941))):
        Polygon((0, -12), (-3, -15), (0, -15), align=None)
    extrude(amount=F3_T217_DEPTH)

    split(bisect_by=Plane.XY.offset(-18.9999690364), keep=Keep.TOP)


with BuildPart() as f3_tool211_1:
    add(f3_tool211.part)

    # F3_t219: intersect F3_tool215
    add(f3_tool215.part, mode=Mode.INTERSECT)


with BuildPart() as f1_33:
    add(f1_32.part)

    # F3_t209: cut F3_tool211
    add(f3_tool211_1.part, mode=Mode.SUBTRACT)


with BuildPart() as f3_tool222:
    # F3_s223 → F3_t224 (new body)
    with BuildSketch(Plane(origin=(-51.4360857888, 0, 20.2060072), x_dir=(0, 1, 0), z_dir=(0.930757815, 0, -0.3656362809))):
        Polygon((-3, -15), (0, -12), (0, -15), align=None)
    extrude(amount=F3_T224_DEPTH)

    split(bisect_by=Plane(origin=(-1.6642890677, 0, 2.1235944635), x_dir=(0, 1, 0), z_dir=(0.6168472612, 0, -0.7870828777)), keep=Keep.TOP)


with BuildPart() as f3_tool226:
    # F3_s227 → F3_t228 (new body)
    with BuildSketch(Plane(origin=(-8.8744478881, 0, -6.9550221835), x_dir=(0, 1, 0), z_dir=(-0.7870828777, 0, -0.6168472612))):
        Polygon((0, 0.3019430054), (-3, -2.6980569946), (0, -2.6980569946), align=None)
    extrude(amount=F3_T228_DEPTH)

    split(bisect_by=Plane(origin=(-5.4845442131, 0, -13.9613672244), x_dir=(0, 1, 0), z_dir=(0.3656362809, 0, 0.930757815)), keep=Keep.TOP)


with BuildPart() as f3_tool222_1:
    add(f3_tool222.part)

    # F3_t230: intersect F3_tool226
    add(f3_tool226.part, mode=Mode.INTERSECT)


with BuildPart() as f1_34:
    add(f1_33.part)

    # F3_t220: cut F3_tool222
    add(f3_tool222_1.part, mode=Mode.SUBTRACT)


with BuildPart() as f3_tool233:
    # F3_s234 → F3_t235 (new body)
    with BuildSketch(Plane(origin=(-4.1209005243, 0, -0.9947803527), x_dir=(0, 1, 0), z_dir=(-0.9720778919, 0, -0.2346584157))):
        Polygon((-3, -15), (0, -12), (0, -15), align=None)
    extrude(amount=F3_T235_DEPTH)

    split(bisect_by=Plane(origin=(-16.4544558566, 0, 9.4999845182), x_dir=(0, 1, 0), z_dir=(0.8660254038, 0, -0.5)), keep=Keep.TOP)


with BuildPart() as f3_tool237:
    # F3_s238 → F3_t239 (new body)
    with BuildSketch(Plane(origin=(18.1662589207, 0, 31.4648834341), x_dir=(0, 1, 0), z_dir=(-0.5, 0, -0.8660254038))):
        Polygon((-3, -18.9999690364), (0, -15.9999690364), (0, -18.9999690364), align=None)
    extrude(amount=F3_T239_DEPTH)

    split(bisect_by=Plane(origin=(-3.5198762352, 0, 14.5811683787), x_dir=(0, 1, 0), z_dir=(0.2346584157, 0, -0.9720778919)), keep=Keep.TOP)


with BuildPart() as f3_tool233_1:
    add(f3_tool233.part)

    # F3_t241: intersect F3_tool237
    add(f3_tool237.part, mode=Mode.INTERSECT)


with BuildPart() as f1_35:
    add(f1_34.part)

    # F3_t231: cut F3_tool233
    add(f3_tool233_1.part, mode=Mode.SUBTRACT)


with BuildPart() as f3_tool244:
    # F3_s245 → F3_t246 (new body)
    with BuildSketch(Plane(origin=(43.2169584386, 0, 34.4419533643), x_dir=(0, 1, 0), z_dir=(-0.7820292153, 0, -0.6232417721))):
        Polygon((0, -12), (-3, -15), (0, -15), align=None)
    extrude(amount=F3_T246_DEPTH)

    split(bisect_by=Plane(origin=(2.6712312866, 0, 0.3795193801), x_dir=(0, 1, 0), z_dir=(-0.9900573976, 0, -0.1406639596)), keep=Keep.TOP)


with BuildPart() as f3_tool248:
    # F3_s249 → F3_t250 (new body)
    with BuildSketch(Plane(origin=(-1.5860019507, 0, 11.1630084074), x_dir=(0, 1, 0), z_dir=(-0.1406639596, 0, 0.9900573976))):
        Polygon((0, 0.3019430054), (-3, -2.6980569946), (0, -2.6980569946), align=None)
    extrude(amount=F3_T250_DEPTH)

    split(bisect_by=Plane(origin=(-9.3486265813, 0, 11.7304382289), x_dir=(0, 1, 0), z_dir=(0.6232417721, 0, -0.7820292153)), keep=Keep.TOP)


with BuildPart() as f3_tool244_1:
    add(f3_tool244.part)

    # F3_t252: intersect F3_tool248
    add(f3_tool248.part, mode=Mode.INTERSECT)


with BuildPart() as f1_36:
    add(f1_35.part)

    # F3_t242: cut F3_tool244
    add(f3_tool244_1.part, mode=Mode.SUBTRACT)


solid = f1_36.part
